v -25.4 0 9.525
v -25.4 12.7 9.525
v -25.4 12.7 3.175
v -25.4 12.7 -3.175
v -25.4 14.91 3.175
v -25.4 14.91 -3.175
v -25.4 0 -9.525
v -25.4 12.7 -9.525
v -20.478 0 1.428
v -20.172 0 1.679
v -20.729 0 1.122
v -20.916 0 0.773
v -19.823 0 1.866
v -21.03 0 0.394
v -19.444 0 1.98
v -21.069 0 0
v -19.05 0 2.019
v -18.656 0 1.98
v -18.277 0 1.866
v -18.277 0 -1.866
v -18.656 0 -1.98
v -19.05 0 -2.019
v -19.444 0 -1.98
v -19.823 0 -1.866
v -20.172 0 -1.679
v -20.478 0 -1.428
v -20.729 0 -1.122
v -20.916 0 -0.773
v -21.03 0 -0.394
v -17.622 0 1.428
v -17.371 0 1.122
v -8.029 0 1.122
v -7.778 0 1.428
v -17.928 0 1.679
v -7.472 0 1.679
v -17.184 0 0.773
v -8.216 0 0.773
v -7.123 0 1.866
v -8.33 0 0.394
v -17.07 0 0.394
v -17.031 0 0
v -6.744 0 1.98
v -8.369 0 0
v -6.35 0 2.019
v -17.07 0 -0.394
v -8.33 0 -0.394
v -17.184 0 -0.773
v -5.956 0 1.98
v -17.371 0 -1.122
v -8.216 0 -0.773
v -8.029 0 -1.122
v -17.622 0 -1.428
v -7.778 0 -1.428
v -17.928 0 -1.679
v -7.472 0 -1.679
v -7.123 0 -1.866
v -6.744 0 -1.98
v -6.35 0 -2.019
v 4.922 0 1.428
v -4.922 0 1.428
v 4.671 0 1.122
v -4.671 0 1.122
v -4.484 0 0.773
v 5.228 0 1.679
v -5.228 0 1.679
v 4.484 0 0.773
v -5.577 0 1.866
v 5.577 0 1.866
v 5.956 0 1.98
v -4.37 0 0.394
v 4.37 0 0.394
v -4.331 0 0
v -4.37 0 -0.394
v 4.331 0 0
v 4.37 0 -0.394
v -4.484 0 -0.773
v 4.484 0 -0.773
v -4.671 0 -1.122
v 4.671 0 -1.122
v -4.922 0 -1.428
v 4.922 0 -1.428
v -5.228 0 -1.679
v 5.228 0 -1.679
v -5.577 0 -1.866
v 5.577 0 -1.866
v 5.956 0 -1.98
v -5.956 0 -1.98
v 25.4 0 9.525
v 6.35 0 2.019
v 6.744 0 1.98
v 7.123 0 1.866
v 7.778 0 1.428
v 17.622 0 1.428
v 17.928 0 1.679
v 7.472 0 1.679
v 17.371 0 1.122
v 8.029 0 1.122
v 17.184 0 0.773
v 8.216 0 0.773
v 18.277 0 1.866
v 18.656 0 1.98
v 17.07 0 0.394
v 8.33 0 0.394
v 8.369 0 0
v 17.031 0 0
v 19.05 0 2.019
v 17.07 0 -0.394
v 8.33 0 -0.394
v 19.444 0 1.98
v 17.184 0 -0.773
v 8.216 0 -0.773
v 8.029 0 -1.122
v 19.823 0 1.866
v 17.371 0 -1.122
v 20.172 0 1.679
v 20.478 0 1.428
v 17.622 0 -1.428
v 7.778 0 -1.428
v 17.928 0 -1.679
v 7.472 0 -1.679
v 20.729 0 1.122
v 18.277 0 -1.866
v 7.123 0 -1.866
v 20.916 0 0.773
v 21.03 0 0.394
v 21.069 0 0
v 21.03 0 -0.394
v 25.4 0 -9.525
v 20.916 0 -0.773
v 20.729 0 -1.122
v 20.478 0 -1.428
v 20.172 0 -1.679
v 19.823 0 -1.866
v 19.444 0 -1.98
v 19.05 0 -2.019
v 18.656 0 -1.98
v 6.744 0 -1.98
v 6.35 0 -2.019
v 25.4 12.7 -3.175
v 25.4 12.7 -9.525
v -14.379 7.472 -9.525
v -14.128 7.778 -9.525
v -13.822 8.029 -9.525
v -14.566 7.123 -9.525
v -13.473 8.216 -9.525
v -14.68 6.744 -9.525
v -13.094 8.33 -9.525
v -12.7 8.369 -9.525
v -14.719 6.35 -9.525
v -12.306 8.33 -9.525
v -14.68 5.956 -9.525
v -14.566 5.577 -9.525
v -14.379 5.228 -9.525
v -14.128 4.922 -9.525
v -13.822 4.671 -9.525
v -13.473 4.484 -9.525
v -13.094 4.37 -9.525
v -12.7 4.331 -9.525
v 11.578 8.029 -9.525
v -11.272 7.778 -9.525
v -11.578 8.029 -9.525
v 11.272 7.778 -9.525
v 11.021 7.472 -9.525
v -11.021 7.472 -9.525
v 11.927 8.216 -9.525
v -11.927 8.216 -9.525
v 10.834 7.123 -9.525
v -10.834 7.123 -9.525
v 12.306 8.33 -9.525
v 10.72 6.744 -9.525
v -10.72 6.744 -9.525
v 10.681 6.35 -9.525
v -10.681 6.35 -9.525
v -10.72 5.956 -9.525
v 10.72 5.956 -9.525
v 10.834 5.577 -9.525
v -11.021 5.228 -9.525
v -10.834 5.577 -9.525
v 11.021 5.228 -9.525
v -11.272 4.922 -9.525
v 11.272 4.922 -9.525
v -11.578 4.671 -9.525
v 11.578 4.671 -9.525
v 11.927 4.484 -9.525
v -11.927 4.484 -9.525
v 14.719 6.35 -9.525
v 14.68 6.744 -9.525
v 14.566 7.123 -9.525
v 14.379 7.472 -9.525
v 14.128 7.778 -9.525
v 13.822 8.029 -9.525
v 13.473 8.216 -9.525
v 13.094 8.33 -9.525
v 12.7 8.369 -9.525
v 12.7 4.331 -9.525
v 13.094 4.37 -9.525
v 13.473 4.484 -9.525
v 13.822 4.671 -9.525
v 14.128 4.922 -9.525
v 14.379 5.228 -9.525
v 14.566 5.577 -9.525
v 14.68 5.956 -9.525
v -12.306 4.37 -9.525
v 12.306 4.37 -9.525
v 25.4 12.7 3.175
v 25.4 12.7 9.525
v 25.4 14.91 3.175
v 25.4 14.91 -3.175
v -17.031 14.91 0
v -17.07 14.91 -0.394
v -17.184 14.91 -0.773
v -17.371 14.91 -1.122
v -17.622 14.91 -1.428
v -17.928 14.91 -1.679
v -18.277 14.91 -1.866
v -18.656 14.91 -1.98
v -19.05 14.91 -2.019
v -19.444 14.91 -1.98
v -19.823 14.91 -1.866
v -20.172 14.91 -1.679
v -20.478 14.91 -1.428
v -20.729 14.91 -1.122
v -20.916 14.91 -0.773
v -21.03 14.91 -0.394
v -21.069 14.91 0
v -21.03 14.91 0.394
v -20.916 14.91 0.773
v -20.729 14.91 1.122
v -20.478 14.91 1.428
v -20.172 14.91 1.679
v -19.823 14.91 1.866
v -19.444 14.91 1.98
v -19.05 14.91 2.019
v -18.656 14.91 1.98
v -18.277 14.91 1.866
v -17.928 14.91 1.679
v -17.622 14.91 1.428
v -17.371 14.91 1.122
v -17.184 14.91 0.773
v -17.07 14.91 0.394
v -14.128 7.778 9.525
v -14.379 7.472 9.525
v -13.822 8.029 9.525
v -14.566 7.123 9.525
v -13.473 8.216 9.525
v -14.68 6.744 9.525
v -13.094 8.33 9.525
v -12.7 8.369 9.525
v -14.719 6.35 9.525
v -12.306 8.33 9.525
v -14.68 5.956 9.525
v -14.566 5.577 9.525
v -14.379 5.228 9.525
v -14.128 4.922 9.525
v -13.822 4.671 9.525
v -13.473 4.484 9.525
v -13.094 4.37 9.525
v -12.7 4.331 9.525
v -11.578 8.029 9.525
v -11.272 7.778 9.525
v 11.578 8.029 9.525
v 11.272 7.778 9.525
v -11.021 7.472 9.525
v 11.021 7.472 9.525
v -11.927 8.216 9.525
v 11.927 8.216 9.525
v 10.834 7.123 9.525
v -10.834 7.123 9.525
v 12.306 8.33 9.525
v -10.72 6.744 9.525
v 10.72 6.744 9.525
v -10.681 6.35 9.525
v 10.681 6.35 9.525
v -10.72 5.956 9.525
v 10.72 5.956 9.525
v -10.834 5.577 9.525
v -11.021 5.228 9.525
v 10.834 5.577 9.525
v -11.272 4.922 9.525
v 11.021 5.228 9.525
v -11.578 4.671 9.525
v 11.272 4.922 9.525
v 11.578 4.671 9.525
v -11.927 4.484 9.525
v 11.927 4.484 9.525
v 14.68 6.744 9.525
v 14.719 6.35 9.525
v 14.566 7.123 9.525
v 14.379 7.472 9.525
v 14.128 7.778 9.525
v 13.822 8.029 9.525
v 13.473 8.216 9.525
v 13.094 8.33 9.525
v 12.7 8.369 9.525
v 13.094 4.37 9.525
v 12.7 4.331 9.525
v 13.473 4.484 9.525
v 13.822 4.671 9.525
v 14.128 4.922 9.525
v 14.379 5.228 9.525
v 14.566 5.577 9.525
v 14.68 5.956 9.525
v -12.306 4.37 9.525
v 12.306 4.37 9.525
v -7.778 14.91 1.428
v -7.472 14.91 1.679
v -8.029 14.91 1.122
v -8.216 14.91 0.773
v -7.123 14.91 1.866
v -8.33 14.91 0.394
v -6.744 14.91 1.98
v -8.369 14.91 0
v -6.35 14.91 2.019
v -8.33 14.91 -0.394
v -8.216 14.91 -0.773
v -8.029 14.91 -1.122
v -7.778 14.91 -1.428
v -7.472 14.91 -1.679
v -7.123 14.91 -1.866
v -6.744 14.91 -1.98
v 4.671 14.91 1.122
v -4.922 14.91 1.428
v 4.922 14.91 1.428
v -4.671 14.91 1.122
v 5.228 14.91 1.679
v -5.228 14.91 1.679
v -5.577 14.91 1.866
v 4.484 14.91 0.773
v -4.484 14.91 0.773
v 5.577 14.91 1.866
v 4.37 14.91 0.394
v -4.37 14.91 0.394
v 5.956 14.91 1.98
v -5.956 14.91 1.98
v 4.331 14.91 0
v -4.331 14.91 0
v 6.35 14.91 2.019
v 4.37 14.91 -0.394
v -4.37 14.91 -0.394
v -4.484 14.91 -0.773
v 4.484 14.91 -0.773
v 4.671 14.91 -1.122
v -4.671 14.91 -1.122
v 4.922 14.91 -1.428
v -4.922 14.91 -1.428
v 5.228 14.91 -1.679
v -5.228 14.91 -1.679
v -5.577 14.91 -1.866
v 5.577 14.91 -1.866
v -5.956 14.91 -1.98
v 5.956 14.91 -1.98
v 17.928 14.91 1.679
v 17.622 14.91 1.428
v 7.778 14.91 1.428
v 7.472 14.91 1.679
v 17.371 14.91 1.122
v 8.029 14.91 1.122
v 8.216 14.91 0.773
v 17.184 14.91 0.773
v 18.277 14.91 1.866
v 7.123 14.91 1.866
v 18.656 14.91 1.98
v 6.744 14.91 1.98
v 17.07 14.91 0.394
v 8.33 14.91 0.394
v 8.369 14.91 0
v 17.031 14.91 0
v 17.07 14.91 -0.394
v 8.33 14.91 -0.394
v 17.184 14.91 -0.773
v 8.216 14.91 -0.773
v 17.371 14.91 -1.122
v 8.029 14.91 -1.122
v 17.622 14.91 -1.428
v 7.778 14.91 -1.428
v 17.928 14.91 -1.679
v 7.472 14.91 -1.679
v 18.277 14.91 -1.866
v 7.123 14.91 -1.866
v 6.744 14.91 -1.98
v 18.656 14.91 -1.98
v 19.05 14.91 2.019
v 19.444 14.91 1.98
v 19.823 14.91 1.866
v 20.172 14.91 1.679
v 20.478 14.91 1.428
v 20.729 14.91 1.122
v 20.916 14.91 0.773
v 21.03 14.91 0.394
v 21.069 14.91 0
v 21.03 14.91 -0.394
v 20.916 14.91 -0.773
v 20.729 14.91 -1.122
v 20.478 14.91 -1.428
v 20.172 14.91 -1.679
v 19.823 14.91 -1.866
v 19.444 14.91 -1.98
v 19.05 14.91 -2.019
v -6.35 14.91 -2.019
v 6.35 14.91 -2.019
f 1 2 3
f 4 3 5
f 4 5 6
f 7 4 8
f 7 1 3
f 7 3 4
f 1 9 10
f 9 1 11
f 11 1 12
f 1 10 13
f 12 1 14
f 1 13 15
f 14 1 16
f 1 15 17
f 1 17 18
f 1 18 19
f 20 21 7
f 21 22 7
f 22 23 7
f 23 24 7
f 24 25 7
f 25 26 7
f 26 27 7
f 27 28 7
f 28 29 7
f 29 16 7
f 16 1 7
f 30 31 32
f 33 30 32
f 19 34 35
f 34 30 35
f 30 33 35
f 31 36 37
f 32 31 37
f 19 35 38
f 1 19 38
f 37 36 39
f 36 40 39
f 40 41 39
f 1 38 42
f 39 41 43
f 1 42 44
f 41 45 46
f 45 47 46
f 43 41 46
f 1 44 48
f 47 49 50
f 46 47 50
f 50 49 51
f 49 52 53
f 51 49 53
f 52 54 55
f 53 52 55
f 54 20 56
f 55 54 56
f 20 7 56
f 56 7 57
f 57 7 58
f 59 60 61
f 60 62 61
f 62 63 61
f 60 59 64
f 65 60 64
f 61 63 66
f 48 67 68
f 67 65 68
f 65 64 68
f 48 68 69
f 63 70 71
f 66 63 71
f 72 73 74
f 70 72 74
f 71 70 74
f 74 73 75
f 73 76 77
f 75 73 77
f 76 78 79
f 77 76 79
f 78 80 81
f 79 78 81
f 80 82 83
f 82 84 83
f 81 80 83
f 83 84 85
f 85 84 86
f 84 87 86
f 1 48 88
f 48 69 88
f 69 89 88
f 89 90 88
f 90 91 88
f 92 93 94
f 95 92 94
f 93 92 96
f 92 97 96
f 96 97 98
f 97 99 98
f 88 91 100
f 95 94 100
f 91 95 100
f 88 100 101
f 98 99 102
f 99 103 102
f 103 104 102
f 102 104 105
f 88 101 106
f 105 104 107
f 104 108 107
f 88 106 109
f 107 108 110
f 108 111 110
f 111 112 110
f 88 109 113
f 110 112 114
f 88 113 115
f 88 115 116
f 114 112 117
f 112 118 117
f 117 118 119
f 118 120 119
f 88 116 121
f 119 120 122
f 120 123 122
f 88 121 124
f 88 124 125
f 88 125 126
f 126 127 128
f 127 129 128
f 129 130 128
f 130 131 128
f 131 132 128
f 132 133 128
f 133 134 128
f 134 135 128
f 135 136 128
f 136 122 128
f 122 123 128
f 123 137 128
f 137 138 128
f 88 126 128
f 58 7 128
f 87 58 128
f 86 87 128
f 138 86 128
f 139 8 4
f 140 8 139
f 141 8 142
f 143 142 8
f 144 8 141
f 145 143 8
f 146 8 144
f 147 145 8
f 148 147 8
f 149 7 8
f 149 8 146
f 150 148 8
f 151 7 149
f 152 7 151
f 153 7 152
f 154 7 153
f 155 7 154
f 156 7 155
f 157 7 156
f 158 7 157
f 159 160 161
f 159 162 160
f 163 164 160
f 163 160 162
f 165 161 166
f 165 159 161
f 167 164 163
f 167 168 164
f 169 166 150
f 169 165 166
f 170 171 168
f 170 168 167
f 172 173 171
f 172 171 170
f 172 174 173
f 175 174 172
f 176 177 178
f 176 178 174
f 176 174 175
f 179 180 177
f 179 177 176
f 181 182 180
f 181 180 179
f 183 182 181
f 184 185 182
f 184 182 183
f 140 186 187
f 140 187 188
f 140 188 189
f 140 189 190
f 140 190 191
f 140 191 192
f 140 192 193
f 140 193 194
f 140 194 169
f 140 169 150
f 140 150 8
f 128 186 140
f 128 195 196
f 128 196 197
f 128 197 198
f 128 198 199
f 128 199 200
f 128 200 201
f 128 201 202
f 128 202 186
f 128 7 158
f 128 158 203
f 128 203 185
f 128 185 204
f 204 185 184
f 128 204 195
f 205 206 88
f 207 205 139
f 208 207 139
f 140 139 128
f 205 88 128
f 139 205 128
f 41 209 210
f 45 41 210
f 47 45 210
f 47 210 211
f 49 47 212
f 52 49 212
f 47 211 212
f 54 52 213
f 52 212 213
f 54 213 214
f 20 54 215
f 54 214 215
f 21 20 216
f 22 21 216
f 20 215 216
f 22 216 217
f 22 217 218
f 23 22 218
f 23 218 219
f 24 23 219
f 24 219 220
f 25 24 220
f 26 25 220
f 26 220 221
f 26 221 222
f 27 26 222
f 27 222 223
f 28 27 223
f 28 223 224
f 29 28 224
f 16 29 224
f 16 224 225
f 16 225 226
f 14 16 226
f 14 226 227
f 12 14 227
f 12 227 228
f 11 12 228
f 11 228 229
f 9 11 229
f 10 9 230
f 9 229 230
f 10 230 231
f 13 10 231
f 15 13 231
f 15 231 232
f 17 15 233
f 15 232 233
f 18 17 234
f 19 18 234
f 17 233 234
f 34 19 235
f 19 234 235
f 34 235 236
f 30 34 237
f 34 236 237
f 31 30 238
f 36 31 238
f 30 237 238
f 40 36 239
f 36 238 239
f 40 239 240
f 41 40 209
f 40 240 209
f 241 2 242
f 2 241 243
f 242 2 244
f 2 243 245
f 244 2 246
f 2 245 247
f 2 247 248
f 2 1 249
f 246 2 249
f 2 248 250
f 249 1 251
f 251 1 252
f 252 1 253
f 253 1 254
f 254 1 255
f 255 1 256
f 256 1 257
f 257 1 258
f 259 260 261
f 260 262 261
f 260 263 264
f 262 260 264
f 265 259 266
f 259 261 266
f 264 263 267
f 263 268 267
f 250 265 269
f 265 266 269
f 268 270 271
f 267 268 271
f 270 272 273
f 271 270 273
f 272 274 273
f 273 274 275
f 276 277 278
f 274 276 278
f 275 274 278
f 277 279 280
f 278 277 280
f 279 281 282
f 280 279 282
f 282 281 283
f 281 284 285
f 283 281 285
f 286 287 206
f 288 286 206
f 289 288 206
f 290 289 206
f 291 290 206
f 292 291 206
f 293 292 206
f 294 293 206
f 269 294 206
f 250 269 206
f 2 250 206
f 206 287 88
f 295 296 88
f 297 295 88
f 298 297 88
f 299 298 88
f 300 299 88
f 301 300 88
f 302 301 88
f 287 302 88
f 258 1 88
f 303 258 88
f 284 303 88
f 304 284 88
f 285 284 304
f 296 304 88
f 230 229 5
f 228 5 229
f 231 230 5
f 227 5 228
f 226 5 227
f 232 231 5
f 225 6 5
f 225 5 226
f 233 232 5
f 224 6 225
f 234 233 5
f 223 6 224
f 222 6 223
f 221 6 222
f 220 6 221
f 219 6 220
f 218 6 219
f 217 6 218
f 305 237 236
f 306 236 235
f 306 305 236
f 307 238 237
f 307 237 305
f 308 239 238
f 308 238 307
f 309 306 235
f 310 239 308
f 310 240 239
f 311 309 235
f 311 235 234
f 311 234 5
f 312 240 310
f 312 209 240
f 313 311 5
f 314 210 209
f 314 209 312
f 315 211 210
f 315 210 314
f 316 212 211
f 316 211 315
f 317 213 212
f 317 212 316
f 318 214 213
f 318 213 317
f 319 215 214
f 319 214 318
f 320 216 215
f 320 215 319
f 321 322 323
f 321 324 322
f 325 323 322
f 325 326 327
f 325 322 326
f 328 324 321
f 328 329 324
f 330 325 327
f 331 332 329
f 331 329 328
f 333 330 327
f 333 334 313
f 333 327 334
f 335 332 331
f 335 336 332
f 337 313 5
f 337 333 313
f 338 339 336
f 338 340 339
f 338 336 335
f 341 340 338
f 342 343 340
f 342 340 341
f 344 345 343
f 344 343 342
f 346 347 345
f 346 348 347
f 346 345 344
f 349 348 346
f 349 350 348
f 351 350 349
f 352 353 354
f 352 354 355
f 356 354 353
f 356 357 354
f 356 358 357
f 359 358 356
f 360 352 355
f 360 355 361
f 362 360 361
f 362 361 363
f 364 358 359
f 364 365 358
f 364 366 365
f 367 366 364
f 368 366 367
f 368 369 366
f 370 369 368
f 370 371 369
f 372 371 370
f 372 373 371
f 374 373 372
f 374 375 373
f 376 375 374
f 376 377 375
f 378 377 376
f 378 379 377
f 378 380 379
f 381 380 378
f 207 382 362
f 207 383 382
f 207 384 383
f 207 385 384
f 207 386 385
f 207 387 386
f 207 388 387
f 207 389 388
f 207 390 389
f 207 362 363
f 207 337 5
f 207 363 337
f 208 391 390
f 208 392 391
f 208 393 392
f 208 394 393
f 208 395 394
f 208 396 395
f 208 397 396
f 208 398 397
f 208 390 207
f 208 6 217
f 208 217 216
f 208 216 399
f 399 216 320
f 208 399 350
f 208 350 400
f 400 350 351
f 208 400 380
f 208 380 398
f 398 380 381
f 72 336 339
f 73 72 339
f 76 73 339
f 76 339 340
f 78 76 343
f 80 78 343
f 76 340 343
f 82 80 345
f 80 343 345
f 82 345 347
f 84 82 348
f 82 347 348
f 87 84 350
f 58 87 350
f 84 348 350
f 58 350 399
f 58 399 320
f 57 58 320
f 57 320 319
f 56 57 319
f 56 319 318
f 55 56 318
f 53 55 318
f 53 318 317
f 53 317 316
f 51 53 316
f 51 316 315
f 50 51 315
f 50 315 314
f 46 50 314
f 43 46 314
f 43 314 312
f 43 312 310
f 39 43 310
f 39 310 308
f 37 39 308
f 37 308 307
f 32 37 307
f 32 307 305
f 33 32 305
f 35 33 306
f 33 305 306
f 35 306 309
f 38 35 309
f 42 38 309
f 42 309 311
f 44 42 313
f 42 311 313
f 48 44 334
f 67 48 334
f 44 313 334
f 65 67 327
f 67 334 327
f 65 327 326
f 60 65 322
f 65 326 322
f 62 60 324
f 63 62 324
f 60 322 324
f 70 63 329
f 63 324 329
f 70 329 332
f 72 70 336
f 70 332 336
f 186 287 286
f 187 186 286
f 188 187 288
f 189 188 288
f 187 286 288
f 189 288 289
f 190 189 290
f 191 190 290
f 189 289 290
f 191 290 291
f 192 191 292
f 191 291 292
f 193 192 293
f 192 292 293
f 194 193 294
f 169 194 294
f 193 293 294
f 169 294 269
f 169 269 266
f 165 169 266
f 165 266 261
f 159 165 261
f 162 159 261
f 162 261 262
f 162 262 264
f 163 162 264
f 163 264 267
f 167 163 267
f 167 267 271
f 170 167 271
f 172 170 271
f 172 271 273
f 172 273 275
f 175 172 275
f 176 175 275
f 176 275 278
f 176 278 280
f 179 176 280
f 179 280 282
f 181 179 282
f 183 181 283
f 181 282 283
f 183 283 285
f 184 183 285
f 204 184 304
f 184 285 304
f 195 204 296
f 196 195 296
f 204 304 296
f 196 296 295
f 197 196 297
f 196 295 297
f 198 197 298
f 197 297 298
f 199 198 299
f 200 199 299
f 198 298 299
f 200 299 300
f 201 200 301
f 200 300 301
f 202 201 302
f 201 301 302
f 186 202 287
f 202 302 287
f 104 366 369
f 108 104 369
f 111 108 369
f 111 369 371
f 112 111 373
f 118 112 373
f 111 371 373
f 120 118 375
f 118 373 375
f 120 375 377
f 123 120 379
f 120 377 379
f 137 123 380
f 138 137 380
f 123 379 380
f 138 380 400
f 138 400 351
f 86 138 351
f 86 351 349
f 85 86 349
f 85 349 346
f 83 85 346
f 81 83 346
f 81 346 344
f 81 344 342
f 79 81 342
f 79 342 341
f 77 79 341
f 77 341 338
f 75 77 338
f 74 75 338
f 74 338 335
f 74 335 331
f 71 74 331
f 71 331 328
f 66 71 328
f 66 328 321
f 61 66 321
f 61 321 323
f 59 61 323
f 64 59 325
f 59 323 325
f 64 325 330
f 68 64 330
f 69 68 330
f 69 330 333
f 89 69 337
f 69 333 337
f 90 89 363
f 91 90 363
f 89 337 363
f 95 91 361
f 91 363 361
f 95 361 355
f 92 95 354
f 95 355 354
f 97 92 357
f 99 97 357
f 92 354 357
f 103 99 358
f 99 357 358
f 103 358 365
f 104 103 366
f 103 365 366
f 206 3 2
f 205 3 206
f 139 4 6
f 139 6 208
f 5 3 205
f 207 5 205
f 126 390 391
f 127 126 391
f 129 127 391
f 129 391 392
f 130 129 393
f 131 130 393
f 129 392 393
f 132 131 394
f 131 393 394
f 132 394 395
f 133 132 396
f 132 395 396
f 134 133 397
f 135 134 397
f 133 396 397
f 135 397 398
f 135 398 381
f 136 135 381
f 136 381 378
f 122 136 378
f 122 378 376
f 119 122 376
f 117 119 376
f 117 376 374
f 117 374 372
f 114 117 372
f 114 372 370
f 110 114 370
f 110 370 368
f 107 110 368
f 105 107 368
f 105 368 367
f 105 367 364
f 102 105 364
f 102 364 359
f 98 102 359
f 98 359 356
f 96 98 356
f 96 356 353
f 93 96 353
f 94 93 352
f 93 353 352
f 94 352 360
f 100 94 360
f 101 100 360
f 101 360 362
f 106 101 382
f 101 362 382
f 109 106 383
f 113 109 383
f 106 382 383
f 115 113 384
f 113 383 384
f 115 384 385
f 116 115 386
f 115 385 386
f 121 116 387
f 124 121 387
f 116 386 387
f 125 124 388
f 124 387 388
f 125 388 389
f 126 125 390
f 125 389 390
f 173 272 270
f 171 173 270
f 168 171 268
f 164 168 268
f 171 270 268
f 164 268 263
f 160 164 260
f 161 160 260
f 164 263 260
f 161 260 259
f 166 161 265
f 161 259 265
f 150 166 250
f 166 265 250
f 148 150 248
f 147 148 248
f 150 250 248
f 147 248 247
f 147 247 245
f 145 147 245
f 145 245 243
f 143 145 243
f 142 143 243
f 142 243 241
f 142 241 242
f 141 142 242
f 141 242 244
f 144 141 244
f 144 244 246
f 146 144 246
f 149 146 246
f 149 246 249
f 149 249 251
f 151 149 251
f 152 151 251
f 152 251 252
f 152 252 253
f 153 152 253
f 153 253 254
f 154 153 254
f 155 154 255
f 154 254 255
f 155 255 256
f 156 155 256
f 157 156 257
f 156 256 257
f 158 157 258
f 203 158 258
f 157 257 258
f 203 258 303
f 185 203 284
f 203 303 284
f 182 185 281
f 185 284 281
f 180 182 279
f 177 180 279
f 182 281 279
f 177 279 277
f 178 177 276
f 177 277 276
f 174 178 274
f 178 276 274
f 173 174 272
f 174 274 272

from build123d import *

# Parameters (mm, degrees)
SKETCH1_W              = 50.8
SKETCH1_H              = 19.05
BOSS_EXTRUDE1_DEPTH    = 12.7
SKETCH2_W              = 50.8
SKETCH2_H              = 6.35
BOSS_EXTRUDE2_DEPTH    = 2.2098
F_10_32_TAPPED_HOLE1_D = 4.0386
F_10_32_TAPPED_HOLE2_D = 4.0386


with BuildPart() as part:
    # Sketch1 → Boss-Extrude1 (new body)
    with BuildSketch(Plane(origin=(0, 0, 0), x_dir=(1, 0, 0), z_dir=(0, 1, 0))):
        Rectangle(SKETCH1_W, SKETCH1_H)
    extrude(amount=BOSS_EXTRUDE1_DEPTH)

    # Sketch2 → Boss-Extrude2 (add)
    with BuildSketch(Plane(origin=(0, 12.7, 0), x_dir=(1, 0, 0), z_dir=(0, 1, 0))):
        Rectangle(SKETCH2_W, SKETCH2_H)
    extrude(amount=BOSS_EXTRUDE2_DEPTH)

    # #10-32 Tapped Hole1 (through all)
    with Locations(Plane(origin=(0, 0, -9.525), x_dir=(-1, 0, 0), z_dir=(0, 0, -1))):
        with Locations((12.7, 6.35), (-12.7, 6.35)):
            Hole(F_10_32_TAPPED_HOLE1_D / 2)

    # #10-32 Tapped Hole2 (through all)
    with Locations(Plane(origin=(0, 0, 0), x_dir=(-1, 0, 0), z_dir=(0, -1, 0))):
        with Locations((-19.05, 0), (19.05, 0), (6.35, 0), (-6.35, 0)):
            Hole(F_10_32_TAPPED_HOLE2_D / 2)


solid = part.part
